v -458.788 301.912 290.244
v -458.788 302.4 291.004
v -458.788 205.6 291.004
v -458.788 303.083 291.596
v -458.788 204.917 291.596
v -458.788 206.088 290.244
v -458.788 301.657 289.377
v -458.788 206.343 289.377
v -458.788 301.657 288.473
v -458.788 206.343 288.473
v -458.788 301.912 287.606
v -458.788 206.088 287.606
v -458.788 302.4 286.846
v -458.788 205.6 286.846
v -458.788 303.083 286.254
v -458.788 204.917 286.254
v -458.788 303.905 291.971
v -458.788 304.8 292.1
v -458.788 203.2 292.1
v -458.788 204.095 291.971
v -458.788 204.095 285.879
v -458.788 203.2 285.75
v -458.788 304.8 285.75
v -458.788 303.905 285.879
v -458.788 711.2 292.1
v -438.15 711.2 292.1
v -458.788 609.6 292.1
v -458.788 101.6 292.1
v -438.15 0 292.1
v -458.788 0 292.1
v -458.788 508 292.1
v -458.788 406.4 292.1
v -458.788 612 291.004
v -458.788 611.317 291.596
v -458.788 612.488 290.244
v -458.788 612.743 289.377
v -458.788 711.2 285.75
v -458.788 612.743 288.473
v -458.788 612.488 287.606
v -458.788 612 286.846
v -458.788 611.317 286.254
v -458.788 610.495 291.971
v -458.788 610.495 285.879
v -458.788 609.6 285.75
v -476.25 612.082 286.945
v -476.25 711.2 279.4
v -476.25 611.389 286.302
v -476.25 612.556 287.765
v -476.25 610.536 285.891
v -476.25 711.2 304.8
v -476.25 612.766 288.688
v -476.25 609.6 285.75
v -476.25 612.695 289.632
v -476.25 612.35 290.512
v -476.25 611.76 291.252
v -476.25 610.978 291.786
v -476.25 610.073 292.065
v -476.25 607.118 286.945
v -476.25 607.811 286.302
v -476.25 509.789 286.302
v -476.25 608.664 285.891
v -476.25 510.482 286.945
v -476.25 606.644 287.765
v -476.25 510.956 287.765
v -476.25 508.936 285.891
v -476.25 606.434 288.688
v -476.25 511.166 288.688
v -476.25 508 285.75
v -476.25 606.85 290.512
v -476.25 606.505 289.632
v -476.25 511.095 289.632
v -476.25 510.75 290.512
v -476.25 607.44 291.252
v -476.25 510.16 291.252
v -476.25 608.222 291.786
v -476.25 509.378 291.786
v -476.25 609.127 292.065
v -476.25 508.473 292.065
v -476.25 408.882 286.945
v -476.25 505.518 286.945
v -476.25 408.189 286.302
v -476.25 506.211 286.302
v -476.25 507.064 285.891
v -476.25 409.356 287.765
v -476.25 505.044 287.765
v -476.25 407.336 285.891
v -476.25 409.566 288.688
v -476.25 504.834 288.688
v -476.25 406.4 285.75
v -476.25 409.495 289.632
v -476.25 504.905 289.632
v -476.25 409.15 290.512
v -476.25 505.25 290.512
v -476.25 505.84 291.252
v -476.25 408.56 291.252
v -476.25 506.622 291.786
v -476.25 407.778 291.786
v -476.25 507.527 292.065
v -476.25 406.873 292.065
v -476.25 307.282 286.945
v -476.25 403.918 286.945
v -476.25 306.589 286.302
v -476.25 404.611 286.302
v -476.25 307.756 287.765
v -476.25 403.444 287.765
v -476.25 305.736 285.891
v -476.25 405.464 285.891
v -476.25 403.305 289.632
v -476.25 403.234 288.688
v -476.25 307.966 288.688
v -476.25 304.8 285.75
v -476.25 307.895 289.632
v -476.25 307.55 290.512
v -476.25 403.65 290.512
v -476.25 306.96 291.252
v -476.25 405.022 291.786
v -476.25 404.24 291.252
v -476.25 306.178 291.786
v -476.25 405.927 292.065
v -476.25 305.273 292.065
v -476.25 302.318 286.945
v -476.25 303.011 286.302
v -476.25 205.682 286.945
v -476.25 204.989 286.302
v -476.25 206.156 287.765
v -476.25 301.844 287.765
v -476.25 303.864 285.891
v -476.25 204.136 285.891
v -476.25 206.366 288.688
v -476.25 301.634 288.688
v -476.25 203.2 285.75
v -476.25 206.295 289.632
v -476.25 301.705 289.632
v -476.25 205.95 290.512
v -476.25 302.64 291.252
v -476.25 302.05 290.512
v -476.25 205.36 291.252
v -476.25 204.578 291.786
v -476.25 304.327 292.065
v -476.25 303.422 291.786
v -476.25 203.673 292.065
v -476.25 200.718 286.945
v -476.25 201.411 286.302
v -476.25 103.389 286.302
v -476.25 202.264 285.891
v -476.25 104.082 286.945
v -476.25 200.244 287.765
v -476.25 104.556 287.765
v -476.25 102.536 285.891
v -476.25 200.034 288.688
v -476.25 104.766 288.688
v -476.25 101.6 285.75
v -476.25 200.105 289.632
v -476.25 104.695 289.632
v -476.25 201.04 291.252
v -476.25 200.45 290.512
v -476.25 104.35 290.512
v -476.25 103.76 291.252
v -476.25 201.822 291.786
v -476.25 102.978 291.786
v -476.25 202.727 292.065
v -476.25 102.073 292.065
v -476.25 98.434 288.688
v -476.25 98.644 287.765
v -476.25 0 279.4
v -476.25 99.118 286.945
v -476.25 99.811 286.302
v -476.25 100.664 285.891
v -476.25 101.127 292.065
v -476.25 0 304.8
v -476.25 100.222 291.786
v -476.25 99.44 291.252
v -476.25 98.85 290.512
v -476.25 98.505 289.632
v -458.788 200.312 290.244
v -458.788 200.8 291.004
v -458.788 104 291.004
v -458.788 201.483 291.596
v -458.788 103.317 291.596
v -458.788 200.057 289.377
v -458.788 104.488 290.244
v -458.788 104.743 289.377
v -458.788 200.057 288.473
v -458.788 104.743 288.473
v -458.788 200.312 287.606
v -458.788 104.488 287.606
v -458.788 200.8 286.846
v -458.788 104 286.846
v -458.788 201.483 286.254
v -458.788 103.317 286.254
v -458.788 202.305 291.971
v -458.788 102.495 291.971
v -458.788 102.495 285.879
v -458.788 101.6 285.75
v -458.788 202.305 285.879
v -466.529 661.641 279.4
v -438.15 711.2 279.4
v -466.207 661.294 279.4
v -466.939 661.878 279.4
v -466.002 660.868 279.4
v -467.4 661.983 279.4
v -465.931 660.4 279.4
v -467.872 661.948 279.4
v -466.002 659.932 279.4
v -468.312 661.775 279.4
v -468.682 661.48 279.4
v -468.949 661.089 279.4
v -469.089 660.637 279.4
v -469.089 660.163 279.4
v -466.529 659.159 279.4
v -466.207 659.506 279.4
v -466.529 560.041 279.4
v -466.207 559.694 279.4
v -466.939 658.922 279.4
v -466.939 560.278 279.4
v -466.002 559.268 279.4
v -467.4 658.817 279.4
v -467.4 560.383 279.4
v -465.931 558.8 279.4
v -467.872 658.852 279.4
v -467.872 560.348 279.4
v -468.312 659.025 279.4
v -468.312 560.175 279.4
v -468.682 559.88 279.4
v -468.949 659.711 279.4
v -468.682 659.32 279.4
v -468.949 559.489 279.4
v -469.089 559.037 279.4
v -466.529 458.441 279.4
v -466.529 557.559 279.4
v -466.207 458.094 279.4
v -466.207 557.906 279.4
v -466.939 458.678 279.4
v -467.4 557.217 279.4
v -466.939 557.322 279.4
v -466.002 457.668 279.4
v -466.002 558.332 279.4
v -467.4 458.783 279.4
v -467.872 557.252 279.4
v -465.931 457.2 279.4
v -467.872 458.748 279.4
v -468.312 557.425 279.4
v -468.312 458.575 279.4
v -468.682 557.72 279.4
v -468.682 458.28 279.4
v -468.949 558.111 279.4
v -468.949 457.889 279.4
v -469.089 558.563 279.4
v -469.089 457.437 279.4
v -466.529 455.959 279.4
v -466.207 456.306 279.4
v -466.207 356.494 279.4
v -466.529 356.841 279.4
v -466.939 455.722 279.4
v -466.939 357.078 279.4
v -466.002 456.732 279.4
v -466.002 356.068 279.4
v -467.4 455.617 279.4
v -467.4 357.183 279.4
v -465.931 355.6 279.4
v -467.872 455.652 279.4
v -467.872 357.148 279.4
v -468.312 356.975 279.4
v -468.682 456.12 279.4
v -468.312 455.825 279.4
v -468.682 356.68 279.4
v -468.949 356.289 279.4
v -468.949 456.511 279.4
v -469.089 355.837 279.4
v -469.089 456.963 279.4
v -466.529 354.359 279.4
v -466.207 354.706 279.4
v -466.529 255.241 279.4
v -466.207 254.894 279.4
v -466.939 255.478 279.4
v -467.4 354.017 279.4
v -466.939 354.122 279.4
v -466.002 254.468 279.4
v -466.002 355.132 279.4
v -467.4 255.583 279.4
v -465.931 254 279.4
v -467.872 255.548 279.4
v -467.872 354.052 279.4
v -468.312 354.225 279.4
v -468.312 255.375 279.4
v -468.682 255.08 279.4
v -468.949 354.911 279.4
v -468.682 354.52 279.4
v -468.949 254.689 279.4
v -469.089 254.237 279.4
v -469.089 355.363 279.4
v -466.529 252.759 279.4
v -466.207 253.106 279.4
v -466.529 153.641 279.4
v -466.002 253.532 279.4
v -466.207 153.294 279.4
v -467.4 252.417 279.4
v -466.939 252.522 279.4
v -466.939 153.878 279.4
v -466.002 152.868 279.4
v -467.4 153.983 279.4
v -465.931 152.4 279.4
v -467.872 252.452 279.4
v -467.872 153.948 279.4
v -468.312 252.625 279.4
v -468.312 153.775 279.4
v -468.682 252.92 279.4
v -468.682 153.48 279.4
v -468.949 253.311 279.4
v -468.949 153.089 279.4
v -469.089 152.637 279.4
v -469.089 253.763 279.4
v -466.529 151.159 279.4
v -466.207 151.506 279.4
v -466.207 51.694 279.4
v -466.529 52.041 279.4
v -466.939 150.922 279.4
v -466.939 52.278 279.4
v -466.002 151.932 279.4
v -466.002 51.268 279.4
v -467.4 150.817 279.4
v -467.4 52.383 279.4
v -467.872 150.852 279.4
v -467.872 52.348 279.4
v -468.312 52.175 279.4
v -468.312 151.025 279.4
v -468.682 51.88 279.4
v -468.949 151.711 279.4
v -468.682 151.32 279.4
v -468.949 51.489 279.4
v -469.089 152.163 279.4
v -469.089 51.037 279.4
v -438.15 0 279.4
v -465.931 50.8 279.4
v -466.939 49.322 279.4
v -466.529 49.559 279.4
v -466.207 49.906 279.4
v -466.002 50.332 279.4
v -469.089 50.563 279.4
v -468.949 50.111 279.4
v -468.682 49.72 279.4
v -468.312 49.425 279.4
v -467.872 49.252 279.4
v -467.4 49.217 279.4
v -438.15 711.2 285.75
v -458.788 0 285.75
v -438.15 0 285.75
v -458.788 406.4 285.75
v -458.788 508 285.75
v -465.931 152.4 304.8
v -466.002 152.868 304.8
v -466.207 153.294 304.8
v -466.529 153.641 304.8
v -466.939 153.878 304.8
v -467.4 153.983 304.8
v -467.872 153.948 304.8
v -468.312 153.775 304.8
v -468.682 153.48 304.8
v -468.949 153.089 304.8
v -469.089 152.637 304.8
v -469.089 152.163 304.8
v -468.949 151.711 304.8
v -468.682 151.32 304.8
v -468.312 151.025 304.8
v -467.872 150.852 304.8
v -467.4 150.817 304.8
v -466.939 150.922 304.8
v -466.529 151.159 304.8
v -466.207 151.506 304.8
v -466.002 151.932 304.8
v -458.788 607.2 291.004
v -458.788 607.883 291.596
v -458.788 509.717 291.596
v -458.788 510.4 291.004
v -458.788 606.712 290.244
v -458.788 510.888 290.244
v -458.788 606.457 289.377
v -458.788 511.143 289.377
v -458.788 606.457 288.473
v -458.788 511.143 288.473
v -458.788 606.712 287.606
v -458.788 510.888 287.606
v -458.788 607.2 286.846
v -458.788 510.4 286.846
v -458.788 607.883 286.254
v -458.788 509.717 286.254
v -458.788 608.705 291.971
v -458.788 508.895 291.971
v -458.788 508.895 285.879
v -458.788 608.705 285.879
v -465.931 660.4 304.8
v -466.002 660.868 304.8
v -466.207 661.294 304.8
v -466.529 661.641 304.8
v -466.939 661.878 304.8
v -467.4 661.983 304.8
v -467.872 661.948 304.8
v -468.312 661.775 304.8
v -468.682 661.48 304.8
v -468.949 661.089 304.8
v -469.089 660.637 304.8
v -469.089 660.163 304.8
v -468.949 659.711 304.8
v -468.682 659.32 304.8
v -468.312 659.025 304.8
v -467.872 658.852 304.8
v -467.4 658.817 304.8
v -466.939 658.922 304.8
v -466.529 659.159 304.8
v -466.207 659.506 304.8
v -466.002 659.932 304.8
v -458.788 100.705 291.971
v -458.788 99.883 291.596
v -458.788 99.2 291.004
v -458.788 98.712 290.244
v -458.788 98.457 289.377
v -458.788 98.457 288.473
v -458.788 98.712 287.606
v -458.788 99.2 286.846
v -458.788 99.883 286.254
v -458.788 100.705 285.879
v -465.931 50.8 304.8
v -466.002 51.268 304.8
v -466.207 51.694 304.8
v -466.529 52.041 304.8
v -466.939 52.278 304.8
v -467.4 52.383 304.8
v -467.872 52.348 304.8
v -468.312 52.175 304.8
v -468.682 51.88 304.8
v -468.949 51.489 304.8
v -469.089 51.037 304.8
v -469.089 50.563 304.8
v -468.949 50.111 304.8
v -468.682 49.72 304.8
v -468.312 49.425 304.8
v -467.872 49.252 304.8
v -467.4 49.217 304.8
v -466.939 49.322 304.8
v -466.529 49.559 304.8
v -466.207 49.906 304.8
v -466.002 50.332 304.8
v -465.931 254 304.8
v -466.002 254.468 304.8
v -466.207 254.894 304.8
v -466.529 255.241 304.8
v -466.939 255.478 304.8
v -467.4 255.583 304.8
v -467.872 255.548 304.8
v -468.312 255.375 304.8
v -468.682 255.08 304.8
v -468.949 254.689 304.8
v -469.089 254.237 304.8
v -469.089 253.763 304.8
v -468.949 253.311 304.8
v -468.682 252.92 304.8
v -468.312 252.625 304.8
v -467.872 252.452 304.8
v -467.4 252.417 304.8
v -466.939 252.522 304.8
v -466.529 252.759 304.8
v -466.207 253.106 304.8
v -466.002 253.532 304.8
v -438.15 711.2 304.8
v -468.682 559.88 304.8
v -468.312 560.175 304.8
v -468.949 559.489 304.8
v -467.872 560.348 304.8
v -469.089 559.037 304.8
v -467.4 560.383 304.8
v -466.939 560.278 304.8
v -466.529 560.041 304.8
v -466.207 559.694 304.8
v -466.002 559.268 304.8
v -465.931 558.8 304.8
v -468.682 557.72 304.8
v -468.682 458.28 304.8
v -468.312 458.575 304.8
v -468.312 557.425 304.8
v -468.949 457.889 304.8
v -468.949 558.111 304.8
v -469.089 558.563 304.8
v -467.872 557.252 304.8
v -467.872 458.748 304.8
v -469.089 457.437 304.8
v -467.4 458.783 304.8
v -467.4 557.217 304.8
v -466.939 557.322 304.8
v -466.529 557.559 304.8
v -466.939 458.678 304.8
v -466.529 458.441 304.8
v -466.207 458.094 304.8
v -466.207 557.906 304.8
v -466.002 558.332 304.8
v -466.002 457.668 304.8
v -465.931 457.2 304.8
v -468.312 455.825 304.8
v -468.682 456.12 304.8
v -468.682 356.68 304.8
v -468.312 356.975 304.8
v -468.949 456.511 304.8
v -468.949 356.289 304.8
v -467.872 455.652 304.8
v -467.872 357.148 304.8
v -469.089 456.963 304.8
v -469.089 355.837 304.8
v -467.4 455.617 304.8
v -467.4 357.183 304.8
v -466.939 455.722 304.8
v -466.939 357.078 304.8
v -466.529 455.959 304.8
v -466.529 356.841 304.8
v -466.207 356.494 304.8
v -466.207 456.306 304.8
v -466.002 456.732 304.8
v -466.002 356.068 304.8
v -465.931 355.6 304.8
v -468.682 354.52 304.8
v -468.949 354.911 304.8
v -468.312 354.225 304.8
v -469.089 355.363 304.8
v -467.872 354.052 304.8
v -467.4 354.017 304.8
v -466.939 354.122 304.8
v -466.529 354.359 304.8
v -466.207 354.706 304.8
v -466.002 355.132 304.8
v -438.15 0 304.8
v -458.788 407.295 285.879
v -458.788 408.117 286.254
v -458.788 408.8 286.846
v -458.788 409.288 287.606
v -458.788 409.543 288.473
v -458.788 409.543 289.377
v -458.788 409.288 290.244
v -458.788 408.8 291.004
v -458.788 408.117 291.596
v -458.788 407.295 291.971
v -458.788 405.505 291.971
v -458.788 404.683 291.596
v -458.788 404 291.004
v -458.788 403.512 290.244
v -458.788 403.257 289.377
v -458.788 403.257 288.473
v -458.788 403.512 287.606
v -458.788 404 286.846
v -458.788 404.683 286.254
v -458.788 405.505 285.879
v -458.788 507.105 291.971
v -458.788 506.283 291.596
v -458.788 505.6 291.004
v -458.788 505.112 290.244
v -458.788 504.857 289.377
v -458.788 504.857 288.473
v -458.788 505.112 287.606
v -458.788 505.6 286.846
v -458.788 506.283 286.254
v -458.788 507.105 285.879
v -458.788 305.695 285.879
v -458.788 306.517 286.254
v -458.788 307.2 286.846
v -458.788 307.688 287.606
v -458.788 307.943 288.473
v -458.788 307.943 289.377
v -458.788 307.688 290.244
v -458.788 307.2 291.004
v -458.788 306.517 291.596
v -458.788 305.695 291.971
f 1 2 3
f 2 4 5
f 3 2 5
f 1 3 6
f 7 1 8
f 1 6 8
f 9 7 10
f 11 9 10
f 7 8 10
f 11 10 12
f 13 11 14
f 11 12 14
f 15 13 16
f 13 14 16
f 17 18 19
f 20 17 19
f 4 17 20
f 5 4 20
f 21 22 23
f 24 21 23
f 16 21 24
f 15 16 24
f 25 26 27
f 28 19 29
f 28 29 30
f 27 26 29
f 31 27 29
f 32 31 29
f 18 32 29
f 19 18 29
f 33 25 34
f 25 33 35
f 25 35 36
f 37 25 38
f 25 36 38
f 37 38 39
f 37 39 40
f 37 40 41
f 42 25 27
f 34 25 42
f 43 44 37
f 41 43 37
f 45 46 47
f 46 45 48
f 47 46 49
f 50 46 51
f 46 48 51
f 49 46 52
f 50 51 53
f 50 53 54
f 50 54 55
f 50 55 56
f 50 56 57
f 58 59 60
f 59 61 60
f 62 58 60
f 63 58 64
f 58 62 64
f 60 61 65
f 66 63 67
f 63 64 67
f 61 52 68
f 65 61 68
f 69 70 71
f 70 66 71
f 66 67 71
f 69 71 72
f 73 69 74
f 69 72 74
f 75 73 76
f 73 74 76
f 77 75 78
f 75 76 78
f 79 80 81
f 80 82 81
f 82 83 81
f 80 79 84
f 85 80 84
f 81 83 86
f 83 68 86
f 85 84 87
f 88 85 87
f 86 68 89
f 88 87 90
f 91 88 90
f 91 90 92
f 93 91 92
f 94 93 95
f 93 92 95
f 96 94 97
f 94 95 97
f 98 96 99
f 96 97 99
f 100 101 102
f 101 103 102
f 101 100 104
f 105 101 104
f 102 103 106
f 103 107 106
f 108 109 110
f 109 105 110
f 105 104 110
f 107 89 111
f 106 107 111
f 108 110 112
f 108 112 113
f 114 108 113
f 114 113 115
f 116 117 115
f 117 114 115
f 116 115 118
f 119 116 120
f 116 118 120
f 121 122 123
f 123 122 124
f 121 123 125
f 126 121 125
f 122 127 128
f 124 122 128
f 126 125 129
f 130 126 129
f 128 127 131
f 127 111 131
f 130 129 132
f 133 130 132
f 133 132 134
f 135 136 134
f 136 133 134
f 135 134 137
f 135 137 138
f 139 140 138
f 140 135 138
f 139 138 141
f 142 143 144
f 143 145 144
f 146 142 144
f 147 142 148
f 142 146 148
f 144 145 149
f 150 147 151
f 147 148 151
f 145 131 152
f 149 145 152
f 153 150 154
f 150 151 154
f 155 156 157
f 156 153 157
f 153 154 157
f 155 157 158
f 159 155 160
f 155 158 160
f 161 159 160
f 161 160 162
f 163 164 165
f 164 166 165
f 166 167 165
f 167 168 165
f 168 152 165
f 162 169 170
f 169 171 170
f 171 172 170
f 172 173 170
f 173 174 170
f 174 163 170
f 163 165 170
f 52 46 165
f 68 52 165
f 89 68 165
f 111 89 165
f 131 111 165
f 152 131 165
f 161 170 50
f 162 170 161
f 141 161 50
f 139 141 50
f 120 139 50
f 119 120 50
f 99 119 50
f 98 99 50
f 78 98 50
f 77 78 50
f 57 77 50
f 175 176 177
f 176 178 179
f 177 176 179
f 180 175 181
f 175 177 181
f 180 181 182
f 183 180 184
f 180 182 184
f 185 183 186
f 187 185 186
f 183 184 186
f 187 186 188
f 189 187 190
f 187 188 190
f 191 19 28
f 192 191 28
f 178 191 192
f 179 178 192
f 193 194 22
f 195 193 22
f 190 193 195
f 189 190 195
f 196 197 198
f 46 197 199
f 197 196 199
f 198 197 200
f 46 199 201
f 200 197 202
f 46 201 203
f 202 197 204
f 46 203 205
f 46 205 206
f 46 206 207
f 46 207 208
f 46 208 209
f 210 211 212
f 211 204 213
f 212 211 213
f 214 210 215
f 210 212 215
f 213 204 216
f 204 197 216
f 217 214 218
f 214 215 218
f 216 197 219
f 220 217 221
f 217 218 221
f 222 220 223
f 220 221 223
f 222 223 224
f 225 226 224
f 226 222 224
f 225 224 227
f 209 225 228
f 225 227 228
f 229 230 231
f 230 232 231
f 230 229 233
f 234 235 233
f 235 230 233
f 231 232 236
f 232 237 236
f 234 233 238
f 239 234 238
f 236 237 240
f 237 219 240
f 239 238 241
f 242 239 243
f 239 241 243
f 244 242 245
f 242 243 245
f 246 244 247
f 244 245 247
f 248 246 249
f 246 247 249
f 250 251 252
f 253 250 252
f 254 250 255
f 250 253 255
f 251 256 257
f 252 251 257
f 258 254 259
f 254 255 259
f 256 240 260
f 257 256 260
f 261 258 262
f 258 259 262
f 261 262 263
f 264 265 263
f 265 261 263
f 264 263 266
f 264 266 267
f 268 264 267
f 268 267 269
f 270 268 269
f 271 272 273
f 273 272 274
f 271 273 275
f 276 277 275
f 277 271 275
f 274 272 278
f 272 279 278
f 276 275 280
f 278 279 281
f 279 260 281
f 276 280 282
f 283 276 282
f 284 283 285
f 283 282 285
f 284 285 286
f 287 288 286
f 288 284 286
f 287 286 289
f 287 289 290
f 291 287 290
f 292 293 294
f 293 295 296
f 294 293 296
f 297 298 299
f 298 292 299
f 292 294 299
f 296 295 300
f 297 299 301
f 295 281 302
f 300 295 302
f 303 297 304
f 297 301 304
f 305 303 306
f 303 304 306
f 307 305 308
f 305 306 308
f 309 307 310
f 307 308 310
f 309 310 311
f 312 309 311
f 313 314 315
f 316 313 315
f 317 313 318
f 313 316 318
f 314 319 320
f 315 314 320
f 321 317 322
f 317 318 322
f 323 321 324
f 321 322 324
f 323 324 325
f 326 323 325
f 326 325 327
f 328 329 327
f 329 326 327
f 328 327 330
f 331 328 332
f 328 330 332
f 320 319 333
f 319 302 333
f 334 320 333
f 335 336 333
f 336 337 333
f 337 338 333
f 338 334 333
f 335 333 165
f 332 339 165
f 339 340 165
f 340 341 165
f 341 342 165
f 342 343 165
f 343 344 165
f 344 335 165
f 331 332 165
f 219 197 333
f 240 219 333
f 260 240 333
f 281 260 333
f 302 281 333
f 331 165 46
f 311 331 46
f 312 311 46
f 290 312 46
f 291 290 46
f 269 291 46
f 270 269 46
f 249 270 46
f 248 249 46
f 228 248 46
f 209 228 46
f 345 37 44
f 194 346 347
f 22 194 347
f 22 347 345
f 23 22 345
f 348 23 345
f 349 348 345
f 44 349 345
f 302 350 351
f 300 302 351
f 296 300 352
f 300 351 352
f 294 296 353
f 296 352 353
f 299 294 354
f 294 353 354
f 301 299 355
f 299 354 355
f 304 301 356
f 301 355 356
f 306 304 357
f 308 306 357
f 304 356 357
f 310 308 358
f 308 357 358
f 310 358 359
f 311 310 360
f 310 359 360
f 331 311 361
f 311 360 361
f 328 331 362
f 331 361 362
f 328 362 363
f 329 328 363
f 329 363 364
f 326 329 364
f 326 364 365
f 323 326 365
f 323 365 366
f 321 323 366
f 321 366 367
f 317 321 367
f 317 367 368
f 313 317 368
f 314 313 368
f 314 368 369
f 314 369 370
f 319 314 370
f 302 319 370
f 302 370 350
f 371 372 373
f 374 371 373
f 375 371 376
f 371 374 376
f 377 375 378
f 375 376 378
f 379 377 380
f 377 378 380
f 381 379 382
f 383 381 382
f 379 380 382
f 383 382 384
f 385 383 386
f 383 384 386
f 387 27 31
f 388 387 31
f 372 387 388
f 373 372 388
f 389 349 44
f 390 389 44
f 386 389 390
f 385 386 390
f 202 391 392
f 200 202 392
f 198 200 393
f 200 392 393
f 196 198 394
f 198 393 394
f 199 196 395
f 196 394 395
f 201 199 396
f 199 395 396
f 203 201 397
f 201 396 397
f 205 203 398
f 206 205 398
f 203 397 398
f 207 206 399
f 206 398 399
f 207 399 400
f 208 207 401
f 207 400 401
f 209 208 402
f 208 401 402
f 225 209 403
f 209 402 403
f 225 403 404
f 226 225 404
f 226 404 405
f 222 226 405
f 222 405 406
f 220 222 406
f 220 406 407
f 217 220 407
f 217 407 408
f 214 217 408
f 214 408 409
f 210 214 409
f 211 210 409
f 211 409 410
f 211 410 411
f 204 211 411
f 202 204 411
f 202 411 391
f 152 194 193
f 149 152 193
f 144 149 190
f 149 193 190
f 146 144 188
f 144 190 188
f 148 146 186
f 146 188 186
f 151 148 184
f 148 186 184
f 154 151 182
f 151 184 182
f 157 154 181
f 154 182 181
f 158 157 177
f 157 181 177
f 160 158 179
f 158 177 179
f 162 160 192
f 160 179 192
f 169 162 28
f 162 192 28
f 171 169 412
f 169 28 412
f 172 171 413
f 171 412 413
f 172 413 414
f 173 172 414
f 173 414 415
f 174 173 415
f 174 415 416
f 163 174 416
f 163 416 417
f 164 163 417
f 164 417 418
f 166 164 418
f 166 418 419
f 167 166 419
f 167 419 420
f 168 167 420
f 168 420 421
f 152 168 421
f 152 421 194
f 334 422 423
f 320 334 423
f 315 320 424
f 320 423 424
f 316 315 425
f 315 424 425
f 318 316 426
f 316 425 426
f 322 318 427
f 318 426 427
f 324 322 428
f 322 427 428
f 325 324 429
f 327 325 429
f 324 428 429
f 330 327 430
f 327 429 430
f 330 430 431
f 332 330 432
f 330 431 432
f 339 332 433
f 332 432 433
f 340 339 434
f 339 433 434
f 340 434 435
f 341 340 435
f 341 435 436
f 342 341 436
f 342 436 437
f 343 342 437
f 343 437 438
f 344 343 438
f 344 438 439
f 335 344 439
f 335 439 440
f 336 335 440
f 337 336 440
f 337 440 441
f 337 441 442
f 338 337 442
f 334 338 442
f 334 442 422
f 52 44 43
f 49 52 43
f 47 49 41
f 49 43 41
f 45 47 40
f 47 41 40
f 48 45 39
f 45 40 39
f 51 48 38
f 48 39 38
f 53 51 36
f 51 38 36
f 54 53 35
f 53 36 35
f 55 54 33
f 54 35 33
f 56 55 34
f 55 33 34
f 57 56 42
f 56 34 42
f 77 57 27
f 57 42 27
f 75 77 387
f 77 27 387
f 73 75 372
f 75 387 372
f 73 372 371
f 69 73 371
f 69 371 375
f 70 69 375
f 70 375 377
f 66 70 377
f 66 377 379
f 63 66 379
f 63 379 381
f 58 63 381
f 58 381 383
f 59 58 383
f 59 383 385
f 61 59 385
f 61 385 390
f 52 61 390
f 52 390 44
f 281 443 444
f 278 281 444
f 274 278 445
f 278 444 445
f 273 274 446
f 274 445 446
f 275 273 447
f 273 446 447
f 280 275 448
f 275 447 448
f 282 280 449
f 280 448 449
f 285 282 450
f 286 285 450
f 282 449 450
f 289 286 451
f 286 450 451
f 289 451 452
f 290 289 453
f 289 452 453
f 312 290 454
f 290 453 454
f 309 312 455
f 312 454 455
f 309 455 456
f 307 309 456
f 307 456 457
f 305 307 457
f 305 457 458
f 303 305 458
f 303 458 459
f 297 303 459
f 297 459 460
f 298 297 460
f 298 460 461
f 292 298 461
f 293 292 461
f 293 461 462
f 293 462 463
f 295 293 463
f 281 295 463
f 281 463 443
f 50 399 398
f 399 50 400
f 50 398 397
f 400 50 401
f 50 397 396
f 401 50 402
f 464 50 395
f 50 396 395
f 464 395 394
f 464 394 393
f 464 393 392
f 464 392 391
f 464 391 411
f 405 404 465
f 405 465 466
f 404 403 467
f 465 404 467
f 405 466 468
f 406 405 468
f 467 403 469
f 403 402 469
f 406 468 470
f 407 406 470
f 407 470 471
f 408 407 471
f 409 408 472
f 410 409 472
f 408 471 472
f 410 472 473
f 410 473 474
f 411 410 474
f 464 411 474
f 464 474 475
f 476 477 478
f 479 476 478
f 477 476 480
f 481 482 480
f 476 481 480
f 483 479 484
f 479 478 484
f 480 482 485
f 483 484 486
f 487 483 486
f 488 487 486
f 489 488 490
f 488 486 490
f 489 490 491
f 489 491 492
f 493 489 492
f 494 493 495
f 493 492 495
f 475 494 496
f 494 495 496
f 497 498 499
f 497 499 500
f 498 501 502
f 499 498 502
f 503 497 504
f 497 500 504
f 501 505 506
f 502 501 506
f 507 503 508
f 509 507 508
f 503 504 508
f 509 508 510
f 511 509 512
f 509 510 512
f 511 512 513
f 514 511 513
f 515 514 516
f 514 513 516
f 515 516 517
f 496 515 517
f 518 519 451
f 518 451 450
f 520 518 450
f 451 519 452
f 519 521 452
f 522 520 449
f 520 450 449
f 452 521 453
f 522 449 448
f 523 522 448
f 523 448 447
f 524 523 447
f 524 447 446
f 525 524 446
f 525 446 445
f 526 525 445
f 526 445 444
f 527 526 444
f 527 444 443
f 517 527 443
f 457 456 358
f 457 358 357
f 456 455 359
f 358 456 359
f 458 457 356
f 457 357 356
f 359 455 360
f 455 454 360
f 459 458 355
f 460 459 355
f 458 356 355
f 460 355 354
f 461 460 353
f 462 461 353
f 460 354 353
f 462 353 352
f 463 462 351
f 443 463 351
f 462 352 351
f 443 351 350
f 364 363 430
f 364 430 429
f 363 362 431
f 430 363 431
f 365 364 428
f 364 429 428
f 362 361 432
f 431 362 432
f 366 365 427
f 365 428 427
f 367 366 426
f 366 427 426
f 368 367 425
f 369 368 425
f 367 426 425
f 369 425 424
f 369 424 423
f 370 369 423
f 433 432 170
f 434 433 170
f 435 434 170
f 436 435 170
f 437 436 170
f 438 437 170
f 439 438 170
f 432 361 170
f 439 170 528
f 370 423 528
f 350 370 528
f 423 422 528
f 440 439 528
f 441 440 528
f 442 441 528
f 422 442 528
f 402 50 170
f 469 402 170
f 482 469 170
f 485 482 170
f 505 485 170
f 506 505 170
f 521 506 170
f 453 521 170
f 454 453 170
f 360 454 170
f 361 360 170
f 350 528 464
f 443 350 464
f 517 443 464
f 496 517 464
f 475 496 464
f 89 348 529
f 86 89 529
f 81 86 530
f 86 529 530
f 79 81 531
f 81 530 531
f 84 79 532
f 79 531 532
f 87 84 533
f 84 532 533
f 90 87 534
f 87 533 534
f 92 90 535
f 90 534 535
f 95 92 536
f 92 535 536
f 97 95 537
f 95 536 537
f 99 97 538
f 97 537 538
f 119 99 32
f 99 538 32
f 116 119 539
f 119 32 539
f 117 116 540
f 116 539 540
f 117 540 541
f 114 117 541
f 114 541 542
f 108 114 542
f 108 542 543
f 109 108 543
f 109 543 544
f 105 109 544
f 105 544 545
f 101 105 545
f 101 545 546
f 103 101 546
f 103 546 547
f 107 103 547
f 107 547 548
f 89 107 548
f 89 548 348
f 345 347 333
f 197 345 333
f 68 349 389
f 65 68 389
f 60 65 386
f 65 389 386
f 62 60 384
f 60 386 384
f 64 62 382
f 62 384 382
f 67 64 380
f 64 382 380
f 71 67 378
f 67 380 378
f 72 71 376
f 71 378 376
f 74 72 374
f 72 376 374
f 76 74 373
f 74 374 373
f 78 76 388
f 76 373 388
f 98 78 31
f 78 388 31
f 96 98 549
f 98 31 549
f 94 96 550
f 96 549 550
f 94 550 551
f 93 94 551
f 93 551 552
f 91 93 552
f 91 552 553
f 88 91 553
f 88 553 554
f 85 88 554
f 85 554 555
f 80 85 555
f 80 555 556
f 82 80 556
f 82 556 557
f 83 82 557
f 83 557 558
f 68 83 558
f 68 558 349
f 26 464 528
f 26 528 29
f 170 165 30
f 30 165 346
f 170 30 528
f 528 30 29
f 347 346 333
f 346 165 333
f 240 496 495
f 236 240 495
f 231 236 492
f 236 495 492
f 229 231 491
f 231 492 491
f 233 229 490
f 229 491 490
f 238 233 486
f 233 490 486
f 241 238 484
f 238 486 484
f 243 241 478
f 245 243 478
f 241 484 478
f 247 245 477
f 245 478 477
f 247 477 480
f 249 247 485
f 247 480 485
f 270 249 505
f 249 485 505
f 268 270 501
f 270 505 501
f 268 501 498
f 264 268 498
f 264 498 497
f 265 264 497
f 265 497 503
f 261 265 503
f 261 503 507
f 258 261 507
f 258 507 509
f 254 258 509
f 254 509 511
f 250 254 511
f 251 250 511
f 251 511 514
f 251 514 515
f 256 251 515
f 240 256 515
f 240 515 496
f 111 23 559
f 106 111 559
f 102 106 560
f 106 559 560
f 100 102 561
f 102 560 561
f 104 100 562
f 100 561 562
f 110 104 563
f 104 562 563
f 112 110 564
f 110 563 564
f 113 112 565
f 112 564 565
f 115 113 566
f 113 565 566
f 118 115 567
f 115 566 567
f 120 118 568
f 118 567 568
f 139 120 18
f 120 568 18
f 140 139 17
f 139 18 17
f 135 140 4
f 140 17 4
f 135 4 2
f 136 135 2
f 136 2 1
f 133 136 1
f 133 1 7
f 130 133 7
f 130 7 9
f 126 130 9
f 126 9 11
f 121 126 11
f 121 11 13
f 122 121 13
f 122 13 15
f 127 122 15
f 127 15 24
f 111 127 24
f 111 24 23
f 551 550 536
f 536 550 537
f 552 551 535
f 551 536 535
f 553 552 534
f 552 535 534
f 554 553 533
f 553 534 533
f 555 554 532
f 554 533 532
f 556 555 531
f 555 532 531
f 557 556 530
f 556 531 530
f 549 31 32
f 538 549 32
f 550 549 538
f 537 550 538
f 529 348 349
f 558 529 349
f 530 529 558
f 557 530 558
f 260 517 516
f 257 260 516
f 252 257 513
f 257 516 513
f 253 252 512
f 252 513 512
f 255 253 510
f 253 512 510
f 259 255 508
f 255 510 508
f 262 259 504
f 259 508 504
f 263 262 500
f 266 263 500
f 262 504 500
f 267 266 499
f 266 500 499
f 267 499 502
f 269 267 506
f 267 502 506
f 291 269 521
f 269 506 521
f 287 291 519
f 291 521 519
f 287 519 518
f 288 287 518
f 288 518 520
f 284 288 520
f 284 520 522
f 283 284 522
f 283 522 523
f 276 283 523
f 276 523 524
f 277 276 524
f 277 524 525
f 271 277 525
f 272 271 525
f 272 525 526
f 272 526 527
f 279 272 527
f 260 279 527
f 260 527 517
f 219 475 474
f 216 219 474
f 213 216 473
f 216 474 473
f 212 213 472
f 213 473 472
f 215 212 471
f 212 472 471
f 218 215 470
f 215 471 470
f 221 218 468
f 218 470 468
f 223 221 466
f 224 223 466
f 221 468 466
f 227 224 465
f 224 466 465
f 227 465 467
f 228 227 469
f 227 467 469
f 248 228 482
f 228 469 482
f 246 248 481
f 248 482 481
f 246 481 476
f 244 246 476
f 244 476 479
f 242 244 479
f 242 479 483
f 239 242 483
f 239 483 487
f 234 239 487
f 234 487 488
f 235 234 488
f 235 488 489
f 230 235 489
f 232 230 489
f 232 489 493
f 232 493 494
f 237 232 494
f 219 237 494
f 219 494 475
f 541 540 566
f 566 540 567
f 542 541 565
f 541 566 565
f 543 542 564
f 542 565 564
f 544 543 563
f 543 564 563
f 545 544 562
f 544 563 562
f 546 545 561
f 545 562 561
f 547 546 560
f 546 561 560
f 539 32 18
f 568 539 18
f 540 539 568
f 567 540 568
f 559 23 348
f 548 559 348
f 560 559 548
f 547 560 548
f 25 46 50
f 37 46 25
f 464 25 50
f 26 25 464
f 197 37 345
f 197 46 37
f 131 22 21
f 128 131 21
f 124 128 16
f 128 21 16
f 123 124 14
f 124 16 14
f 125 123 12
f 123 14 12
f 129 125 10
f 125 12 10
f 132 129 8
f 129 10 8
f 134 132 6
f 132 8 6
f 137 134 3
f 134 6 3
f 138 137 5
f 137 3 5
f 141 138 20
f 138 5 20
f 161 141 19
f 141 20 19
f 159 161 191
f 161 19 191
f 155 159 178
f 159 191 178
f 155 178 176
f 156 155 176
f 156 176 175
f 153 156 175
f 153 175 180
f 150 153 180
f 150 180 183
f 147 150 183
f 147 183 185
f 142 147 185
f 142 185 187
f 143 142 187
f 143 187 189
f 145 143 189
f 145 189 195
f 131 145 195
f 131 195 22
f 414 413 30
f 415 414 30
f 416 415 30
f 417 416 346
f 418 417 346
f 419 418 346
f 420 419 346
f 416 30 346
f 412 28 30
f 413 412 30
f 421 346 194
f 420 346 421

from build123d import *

# Parameters (mm, degrees)
BOSS_EXTRUDE1_DEPTH             = 711.2
SKETCH3_R                       = 3.175
SASH_ADJUSTMENT_HOLES_CUT_DEPTH = 775.037716398
LPATTERN1_COUNT                 = 6
LPATTERN1_PITCH                 = 101.6
SKETCH4_R                       = 1.5875
MOUNTING_SCREW_HOLES_CUT_DEPTH  = 857.308742511
LPATTERN2_COUNT                 = 7
LPATTERN2_PITCH                 = 101.6


with BuildPart() as part:
    # Sketch2 → Boss-Extrude1 (new body)
    with BuildSketch(Plane(origin=(0, 0, 0), x_dir=(1, 0, 0), z_dir=(0, 1, 0))):
        Polygon((-438.15, -304.8), (-438.15, -292.1), (-458.7875, -292.1), (-458.7875, -285.75), (-438.15, -285.75), (-438.15, -279.4), (-476.25, -279.4), (-476.25, -304.8), align=None)
    extrude(amount=BOSS_EXTRUDE1_DEPTH)

    # Sketch3 → Sash Adjustment Holes Cut (cut, through all)
    with BuildSketch(Plane(origin=(-458.7875, 0, 0), x_dir=(0, 0, -1), z_dir=(1, 0, 0))):
        with Locations((-288.925, 609.6)):
            Circle(SKETCH3_R)
    sash_adjustment_holes_cut = extrude(amount=-SASH_ADJUSTMENT_HOLES_CUT_DEPTH, mode=Mode.SUBTRACT)

    # LPattern1: Sash Adjustment Holes Cut ×6
    with Locations(*[(0, -i * LPATTERN1_PITCH, 0) for i in range(1, LPATTERN1_COUNT)]):
        add(sash_adjustment_holes_cut, mode=Mode.SUBTRACT)

    # Sketch4 → Mounting Screw Holes Cut (cut, through all)
    with BuildSketch(Plane.XY.offset(304.8)):
        with Locations((-467.51875, 50.8)):
            Circle(SKETCH4_R)
    mounting_screw_holes_cut = extrude(amount=-MOUNTING_SCREW_HOLES_CUT_DEPTH, mode=Mode.SUBTRACT)

    # LPattern2: Mounting Screw Holes Cut ×7
    with Locations(*[(0, i * LPATTERN2_PITCH, 0) for i in range(1, LPATTERN2_COUNT)]):
        add(mounting_screw_holes_cut, mode=Mode.SUBTRACT)


solid = part.part
